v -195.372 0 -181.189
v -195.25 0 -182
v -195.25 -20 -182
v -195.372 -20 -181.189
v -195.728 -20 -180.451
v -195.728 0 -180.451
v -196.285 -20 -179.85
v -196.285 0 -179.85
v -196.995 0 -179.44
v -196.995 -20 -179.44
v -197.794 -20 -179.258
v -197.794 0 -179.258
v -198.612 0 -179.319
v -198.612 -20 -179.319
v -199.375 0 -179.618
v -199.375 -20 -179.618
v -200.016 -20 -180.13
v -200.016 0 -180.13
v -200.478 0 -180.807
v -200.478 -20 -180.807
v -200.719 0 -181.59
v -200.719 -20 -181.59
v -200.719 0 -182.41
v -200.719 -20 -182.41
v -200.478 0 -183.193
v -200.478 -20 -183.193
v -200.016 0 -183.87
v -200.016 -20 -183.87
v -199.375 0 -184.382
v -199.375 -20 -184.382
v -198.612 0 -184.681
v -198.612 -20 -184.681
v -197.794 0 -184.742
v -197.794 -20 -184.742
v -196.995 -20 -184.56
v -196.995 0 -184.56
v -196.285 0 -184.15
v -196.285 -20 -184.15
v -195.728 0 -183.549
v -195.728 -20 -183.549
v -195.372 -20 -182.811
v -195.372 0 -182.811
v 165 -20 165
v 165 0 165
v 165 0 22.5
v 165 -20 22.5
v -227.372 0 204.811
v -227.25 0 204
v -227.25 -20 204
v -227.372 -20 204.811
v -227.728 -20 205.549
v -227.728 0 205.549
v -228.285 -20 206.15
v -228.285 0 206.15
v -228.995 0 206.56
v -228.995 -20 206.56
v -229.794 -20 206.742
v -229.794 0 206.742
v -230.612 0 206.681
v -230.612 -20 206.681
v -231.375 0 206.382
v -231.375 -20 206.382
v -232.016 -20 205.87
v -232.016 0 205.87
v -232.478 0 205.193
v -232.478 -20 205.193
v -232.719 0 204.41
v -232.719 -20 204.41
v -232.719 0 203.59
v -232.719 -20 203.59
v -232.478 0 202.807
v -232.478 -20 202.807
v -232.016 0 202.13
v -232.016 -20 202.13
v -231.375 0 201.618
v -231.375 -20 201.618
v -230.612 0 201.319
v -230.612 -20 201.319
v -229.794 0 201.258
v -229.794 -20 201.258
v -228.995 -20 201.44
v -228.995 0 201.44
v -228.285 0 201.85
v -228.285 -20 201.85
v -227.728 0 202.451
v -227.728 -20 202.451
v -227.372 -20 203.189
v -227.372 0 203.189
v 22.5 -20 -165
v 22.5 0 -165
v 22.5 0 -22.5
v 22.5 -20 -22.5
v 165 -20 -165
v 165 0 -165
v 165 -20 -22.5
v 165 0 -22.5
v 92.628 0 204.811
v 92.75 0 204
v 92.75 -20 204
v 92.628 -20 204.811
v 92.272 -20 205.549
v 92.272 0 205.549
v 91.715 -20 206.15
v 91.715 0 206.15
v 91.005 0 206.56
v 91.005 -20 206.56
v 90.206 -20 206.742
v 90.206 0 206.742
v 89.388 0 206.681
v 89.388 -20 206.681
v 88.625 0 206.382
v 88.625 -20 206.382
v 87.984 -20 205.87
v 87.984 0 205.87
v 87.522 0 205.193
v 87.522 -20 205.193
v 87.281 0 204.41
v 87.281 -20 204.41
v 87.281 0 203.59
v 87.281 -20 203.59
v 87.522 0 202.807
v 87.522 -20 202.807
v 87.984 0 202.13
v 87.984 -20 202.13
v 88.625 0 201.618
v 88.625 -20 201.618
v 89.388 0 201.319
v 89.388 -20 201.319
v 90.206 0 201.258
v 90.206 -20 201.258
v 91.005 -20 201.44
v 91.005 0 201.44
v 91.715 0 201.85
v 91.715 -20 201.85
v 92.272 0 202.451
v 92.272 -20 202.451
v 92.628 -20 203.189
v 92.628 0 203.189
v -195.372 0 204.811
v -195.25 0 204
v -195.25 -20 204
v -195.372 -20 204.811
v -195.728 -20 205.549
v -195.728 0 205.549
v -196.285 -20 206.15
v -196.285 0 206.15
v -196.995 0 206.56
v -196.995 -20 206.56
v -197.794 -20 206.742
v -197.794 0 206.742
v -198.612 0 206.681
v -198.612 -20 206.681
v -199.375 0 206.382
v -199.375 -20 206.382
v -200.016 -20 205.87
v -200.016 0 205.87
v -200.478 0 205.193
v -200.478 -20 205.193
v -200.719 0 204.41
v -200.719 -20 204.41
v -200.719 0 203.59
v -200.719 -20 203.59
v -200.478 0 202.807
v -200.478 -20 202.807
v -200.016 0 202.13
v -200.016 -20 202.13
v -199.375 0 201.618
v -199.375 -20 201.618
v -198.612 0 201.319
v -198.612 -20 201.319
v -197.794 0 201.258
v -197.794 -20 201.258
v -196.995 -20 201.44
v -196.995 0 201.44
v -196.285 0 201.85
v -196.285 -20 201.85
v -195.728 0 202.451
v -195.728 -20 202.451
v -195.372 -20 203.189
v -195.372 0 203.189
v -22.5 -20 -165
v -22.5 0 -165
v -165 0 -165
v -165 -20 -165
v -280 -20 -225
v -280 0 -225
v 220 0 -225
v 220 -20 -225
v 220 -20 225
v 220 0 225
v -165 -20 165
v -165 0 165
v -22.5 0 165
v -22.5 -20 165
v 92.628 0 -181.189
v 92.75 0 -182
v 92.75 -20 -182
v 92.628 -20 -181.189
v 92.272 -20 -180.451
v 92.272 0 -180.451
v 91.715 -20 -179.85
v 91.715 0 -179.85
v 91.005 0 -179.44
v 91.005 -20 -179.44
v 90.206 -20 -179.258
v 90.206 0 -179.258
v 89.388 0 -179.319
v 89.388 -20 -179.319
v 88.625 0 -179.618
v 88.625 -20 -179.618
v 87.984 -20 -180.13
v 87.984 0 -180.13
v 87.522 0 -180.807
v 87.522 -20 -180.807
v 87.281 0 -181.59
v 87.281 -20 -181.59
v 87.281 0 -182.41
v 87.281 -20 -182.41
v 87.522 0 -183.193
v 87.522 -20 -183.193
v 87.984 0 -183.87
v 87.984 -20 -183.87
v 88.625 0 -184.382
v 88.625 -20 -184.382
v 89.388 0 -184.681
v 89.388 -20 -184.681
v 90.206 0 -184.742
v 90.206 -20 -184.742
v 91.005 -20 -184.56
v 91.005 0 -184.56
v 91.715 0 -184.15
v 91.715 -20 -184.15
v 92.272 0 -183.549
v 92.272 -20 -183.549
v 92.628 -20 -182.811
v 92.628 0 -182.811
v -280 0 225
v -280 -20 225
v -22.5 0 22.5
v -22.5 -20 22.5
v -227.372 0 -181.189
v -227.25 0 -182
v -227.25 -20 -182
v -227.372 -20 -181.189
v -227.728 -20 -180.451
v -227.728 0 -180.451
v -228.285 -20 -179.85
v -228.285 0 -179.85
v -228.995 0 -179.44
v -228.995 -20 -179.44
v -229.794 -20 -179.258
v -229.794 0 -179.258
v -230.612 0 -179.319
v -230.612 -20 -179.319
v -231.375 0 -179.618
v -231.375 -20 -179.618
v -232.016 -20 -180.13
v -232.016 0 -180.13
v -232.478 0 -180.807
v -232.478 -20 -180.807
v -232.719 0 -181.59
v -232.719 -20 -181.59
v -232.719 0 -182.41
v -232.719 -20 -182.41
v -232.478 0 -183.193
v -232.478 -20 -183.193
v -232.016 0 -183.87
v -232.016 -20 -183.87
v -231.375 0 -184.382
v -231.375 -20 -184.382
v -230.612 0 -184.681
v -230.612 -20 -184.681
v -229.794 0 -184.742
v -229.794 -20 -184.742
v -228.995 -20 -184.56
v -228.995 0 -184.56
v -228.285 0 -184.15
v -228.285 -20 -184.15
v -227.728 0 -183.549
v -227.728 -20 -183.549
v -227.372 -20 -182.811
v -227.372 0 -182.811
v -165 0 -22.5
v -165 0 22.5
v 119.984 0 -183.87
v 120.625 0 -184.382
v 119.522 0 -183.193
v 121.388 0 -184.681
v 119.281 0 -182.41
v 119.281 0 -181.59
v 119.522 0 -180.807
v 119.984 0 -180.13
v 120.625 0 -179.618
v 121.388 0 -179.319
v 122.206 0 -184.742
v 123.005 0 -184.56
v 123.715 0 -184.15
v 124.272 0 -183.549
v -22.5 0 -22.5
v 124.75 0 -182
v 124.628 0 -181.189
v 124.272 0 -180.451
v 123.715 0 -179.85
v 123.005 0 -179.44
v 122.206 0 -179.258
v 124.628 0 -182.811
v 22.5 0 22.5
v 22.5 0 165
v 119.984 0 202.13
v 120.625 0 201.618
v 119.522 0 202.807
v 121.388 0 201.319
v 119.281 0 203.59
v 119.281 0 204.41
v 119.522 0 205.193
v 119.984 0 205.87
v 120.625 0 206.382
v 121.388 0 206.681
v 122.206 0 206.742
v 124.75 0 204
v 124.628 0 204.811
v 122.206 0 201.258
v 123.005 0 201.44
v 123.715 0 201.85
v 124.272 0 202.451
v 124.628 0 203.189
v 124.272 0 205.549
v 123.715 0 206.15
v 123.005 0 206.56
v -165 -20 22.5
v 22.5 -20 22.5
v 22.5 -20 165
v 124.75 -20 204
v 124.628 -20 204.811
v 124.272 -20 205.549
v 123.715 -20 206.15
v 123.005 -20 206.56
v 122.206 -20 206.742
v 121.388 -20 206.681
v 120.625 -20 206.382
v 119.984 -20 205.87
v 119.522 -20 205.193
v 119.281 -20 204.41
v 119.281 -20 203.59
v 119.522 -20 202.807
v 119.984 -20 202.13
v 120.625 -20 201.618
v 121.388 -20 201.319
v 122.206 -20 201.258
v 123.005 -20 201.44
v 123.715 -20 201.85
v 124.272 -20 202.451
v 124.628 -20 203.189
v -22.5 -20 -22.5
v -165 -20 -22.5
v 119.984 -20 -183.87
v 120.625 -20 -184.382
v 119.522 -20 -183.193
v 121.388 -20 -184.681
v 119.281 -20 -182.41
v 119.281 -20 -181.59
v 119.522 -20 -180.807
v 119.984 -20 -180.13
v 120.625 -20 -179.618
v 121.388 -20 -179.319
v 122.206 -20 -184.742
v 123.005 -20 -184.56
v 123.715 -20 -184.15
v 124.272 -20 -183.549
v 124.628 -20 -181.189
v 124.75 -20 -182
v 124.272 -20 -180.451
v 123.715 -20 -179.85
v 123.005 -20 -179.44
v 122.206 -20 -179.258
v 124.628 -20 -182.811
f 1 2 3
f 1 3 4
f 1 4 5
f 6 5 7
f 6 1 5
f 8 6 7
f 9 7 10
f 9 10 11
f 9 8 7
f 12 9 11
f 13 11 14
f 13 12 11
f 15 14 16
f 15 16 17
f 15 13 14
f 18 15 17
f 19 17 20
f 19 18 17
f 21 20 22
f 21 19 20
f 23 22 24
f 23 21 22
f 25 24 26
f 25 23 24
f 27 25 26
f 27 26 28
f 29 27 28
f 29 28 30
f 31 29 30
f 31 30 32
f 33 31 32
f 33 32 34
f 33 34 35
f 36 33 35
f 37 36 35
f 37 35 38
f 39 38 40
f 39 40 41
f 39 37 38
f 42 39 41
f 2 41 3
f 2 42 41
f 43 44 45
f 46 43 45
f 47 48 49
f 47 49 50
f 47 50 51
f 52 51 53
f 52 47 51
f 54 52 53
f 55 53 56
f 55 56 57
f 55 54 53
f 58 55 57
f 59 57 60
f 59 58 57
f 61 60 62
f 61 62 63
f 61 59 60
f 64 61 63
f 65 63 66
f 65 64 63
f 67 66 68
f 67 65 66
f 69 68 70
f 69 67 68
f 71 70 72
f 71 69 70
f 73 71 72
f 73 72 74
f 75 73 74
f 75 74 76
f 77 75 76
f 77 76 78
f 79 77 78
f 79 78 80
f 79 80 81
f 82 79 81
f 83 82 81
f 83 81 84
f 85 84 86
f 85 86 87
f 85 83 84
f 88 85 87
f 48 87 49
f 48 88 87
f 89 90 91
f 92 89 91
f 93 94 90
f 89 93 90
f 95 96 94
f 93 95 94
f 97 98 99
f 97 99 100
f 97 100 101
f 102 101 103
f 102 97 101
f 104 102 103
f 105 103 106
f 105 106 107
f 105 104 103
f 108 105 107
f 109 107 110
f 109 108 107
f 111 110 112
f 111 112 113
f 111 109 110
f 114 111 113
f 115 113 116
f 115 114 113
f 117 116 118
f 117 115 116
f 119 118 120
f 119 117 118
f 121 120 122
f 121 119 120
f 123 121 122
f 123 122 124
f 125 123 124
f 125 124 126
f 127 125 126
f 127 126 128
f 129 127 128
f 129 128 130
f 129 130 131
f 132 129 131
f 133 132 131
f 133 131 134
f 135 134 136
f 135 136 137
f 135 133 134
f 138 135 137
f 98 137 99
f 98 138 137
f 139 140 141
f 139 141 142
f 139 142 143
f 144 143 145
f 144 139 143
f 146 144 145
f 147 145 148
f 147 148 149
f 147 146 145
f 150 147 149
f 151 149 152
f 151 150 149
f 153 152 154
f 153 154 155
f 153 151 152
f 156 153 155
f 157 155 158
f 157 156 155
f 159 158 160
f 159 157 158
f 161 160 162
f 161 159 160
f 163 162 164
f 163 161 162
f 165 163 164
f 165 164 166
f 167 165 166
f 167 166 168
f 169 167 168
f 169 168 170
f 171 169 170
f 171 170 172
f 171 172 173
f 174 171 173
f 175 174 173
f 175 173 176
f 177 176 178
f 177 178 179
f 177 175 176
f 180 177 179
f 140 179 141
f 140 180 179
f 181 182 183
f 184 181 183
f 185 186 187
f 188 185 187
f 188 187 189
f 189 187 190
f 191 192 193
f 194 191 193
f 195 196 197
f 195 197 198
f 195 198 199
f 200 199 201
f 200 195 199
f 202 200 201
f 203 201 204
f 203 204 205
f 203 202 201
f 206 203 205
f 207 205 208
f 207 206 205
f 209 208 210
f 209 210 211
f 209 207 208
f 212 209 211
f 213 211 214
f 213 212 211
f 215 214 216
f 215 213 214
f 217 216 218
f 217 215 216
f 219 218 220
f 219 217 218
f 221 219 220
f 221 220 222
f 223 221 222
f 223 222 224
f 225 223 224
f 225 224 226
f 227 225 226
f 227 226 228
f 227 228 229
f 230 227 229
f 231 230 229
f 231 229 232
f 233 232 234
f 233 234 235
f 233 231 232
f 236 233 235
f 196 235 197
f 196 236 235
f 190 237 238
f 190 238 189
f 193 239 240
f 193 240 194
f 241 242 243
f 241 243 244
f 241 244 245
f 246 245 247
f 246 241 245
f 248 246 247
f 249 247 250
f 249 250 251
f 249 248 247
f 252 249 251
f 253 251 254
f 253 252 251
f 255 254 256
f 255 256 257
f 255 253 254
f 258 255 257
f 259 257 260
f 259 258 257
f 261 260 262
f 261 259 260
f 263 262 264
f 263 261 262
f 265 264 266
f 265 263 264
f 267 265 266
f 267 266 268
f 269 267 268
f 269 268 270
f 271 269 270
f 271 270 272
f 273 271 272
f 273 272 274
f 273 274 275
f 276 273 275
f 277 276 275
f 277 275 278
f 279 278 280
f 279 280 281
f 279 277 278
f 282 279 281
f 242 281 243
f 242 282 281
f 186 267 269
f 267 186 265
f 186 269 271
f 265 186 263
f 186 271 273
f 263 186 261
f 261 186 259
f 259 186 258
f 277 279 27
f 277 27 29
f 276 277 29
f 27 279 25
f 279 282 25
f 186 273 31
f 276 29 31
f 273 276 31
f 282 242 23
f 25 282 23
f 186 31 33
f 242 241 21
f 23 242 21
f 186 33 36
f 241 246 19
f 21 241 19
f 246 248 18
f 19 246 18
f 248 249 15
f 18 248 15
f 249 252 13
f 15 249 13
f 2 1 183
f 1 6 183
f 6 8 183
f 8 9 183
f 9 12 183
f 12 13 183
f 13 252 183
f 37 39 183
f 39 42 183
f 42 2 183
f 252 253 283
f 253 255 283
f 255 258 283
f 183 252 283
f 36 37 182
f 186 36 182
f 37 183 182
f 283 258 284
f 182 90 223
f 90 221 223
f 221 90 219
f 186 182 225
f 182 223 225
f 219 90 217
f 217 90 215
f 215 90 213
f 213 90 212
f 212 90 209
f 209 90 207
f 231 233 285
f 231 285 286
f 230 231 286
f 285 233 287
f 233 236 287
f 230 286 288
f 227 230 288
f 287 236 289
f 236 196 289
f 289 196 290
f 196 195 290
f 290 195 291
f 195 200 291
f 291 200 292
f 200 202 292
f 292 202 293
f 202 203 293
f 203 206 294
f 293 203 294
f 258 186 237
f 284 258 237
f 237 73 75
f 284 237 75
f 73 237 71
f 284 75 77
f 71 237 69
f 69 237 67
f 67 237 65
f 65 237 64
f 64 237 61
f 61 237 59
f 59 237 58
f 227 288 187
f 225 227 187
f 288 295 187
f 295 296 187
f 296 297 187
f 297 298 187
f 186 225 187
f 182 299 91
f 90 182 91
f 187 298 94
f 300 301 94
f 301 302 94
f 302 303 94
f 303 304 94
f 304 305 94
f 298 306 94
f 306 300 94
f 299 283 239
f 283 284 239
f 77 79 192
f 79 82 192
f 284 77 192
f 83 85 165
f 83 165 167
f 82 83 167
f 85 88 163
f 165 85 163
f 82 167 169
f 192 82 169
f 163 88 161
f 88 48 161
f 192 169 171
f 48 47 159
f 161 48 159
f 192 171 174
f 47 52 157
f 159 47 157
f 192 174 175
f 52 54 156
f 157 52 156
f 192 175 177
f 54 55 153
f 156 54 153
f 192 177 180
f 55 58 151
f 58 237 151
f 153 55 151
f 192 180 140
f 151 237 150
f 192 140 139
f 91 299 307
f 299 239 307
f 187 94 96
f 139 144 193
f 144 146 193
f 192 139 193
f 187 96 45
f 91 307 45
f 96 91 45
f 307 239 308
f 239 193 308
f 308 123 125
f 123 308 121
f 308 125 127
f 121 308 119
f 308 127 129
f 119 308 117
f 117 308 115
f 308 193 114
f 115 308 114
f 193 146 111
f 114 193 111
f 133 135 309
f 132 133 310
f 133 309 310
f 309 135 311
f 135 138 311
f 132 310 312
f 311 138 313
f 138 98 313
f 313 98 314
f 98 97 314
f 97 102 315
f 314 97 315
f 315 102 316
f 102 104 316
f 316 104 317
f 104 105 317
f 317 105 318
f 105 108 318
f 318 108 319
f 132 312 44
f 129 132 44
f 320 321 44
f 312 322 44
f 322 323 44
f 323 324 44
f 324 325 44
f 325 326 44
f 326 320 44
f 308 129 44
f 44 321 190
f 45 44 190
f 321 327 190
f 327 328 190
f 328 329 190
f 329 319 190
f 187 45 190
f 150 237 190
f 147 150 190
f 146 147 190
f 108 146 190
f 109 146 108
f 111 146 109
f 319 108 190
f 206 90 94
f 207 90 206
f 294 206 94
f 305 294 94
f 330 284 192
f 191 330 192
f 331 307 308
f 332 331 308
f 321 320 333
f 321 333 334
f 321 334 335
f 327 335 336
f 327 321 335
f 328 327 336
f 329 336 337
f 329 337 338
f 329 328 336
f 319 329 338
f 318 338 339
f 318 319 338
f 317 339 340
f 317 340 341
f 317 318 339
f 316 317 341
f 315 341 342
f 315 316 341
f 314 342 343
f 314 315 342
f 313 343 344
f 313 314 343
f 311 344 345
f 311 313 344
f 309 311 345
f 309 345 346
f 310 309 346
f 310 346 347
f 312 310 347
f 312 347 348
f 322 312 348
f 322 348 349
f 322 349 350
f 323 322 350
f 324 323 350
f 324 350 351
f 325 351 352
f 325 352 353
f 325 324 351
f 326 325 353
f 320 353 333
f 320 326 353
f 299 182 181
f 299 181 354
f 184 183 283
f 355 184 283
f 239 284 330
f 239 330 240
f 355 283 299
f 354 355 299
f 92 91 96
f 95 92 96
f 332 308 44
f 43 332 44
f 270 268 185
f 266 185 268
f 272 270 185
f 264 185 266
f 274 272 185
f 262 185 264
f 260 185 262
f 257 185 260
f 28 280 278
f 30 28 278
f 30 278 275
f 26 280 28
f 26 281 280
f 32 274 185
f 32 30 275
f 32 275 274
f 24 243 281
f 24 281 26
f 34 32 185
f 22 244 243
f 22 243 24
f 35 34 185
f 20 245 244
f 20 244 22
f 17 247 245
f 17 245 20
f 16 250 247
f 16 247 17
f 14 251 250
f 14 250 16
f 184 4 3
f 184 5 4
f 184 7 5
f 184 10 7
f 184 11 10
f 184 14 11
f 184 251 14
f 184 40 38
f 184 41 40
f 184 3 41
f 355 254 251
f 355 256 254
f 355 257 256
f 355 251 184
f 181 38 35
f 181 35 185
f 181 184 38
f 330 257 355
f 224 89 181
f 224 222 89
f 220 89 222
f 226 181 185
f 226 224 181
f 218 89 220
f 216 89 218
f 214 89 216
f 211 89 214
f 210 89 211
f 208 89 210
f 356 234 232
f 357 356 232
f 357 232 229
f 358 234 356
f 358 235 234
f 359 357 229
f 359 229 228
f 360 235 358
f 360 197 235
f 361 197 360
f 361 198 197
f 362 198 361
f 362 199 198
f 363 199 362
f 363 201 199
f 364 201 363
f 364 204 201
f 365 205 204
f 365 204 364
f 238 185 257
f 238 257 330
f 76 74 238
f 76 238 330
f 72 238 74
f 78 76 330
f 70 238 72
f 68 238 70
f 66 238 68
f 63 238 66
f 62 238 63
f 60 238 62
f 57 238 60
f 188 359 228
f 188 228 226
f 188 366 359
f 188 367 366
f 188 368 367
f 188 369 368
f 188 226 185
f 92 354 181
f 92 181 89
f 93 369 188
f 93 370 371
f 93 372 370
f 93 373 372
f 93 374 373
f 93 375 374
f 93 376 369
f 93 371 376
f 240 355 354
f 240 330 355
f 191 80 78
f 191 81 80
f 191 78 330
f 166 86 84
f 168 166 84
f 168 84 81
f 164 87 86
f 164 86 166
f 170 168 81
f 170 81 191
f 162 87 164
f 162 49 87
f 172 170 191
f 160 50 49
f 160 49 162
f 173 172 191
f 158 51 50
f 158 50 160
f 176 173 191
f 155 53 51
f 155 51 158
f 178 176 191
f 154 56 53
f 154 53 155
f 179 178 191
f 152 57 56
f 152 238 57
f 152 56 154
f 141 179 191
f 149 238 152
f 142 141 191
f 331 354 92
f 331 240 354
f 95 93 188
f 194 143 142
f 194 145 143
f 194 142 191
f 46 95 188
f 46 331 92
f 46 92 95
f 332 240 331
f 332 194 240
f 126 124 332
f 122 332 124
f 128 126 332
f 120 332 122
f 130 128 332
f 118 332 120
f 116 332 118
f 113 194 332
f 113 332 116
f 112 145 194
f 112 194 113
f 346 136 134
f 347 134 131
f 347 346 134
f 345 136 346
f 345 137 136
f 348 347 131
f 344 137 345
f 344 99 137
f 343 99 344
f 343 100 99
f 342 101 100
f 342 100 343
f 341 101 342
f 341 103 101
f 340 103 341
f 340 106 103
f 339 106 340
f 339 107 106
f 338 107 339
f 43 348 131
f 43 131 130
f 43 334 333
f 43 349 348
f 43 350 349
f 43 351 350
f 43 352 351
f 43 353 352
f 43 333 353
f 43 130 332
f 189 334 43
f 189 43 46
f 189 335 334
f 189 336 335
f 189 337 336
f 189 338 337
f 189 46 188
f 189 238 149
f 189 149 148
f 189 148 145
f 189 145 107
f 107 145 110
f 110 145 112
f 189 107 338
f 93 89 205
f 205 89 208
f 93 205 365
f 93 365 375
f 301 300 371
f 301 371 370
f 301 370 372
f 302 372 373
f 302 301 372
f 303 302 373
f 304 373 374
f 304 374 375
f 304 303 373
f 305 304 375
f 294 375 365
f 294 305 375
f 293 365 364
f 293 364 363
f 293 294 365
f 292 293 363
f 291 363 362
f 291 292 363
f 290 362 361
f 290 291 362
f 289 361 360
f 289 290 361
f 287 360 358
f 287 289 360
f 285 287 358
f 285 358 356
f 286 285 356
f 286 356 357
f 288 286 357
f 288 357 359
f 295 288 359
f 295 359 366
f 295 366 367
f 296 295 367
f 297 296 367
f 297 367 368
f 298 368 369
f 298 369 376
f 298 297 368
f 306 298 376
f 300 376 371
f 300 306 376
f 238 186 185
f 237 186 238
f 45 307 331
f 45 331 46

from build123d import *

# Parameters (mm, degrees)
F0_W     = 500
F0_H     = 450
F0_R     = 2.75
F0_W_2   = 45
F0_H_2   = 142.5
F0_W_3   = 142.5
F0_H_3   = 45
F1_DEPTH = 20


with BuildPart() as f1:
    # F0 (on Front) → F1 (new body)
    with BuildSketch(Plane.XZ):
        with Locations((-30, 0)):
            Rectangle(F0_W, F0_H)
        with Locations((-230, -182)):
            Circle(F0_R, mode=Mode.SUBTRACT)
        with Locations((-198, -182)):
            Circle(F0_R, mode=Mode.SUBTRACT)
        with Locations((90, -182)):
            Circle(F0_R, mode=Mode.SUBTRACT)
        with Locations((122, -182)):
            Circle(F0_R, mode=Mode.SUBTRACT)
        with Locations((-230, 204)):
            Circle(F0_R, mode=Mode.SUBTRACT)
        with Locations((-198, 204)):
            Circle(F0_R, mode=Mode.SUBTRACT)
        Polygon((-165, 22.5), (-165, 165), (-22.5, 165), (22.5, 165), (165, 165), (165, 22.5), (165, -22.5), (165, -165), (22.5, -165), (-22.5, -165), (-165, -165), (-165, -22.5), align=None, mode=Mode.SUBTRACT)
        with Locations((90, 204)):
            Circle(F0_R, mode=Mode.SUBTRACT)
        with Locations((122, 204)):
            Circle(F0_R, mode=Mode.SUBTRACT)
        with Locations((0, 93.75)):
            Rectangle(F0_W_2, F0_H_2)
        with Locations((-93.75, 0)):
            Rectangle(F0_W_3, F0_H_3)
        with Locations((0, -93.75)):
            Rectangle(F0_W_2, F0_H_2)
        with Locations((93.75, 0)):
            Rectangle(F0_W_3, F0_H_3)
        Rectangle(F0_W_2, F0_H_3)
    extrude(amount=F1_DEPTH)


solid = f1.part
